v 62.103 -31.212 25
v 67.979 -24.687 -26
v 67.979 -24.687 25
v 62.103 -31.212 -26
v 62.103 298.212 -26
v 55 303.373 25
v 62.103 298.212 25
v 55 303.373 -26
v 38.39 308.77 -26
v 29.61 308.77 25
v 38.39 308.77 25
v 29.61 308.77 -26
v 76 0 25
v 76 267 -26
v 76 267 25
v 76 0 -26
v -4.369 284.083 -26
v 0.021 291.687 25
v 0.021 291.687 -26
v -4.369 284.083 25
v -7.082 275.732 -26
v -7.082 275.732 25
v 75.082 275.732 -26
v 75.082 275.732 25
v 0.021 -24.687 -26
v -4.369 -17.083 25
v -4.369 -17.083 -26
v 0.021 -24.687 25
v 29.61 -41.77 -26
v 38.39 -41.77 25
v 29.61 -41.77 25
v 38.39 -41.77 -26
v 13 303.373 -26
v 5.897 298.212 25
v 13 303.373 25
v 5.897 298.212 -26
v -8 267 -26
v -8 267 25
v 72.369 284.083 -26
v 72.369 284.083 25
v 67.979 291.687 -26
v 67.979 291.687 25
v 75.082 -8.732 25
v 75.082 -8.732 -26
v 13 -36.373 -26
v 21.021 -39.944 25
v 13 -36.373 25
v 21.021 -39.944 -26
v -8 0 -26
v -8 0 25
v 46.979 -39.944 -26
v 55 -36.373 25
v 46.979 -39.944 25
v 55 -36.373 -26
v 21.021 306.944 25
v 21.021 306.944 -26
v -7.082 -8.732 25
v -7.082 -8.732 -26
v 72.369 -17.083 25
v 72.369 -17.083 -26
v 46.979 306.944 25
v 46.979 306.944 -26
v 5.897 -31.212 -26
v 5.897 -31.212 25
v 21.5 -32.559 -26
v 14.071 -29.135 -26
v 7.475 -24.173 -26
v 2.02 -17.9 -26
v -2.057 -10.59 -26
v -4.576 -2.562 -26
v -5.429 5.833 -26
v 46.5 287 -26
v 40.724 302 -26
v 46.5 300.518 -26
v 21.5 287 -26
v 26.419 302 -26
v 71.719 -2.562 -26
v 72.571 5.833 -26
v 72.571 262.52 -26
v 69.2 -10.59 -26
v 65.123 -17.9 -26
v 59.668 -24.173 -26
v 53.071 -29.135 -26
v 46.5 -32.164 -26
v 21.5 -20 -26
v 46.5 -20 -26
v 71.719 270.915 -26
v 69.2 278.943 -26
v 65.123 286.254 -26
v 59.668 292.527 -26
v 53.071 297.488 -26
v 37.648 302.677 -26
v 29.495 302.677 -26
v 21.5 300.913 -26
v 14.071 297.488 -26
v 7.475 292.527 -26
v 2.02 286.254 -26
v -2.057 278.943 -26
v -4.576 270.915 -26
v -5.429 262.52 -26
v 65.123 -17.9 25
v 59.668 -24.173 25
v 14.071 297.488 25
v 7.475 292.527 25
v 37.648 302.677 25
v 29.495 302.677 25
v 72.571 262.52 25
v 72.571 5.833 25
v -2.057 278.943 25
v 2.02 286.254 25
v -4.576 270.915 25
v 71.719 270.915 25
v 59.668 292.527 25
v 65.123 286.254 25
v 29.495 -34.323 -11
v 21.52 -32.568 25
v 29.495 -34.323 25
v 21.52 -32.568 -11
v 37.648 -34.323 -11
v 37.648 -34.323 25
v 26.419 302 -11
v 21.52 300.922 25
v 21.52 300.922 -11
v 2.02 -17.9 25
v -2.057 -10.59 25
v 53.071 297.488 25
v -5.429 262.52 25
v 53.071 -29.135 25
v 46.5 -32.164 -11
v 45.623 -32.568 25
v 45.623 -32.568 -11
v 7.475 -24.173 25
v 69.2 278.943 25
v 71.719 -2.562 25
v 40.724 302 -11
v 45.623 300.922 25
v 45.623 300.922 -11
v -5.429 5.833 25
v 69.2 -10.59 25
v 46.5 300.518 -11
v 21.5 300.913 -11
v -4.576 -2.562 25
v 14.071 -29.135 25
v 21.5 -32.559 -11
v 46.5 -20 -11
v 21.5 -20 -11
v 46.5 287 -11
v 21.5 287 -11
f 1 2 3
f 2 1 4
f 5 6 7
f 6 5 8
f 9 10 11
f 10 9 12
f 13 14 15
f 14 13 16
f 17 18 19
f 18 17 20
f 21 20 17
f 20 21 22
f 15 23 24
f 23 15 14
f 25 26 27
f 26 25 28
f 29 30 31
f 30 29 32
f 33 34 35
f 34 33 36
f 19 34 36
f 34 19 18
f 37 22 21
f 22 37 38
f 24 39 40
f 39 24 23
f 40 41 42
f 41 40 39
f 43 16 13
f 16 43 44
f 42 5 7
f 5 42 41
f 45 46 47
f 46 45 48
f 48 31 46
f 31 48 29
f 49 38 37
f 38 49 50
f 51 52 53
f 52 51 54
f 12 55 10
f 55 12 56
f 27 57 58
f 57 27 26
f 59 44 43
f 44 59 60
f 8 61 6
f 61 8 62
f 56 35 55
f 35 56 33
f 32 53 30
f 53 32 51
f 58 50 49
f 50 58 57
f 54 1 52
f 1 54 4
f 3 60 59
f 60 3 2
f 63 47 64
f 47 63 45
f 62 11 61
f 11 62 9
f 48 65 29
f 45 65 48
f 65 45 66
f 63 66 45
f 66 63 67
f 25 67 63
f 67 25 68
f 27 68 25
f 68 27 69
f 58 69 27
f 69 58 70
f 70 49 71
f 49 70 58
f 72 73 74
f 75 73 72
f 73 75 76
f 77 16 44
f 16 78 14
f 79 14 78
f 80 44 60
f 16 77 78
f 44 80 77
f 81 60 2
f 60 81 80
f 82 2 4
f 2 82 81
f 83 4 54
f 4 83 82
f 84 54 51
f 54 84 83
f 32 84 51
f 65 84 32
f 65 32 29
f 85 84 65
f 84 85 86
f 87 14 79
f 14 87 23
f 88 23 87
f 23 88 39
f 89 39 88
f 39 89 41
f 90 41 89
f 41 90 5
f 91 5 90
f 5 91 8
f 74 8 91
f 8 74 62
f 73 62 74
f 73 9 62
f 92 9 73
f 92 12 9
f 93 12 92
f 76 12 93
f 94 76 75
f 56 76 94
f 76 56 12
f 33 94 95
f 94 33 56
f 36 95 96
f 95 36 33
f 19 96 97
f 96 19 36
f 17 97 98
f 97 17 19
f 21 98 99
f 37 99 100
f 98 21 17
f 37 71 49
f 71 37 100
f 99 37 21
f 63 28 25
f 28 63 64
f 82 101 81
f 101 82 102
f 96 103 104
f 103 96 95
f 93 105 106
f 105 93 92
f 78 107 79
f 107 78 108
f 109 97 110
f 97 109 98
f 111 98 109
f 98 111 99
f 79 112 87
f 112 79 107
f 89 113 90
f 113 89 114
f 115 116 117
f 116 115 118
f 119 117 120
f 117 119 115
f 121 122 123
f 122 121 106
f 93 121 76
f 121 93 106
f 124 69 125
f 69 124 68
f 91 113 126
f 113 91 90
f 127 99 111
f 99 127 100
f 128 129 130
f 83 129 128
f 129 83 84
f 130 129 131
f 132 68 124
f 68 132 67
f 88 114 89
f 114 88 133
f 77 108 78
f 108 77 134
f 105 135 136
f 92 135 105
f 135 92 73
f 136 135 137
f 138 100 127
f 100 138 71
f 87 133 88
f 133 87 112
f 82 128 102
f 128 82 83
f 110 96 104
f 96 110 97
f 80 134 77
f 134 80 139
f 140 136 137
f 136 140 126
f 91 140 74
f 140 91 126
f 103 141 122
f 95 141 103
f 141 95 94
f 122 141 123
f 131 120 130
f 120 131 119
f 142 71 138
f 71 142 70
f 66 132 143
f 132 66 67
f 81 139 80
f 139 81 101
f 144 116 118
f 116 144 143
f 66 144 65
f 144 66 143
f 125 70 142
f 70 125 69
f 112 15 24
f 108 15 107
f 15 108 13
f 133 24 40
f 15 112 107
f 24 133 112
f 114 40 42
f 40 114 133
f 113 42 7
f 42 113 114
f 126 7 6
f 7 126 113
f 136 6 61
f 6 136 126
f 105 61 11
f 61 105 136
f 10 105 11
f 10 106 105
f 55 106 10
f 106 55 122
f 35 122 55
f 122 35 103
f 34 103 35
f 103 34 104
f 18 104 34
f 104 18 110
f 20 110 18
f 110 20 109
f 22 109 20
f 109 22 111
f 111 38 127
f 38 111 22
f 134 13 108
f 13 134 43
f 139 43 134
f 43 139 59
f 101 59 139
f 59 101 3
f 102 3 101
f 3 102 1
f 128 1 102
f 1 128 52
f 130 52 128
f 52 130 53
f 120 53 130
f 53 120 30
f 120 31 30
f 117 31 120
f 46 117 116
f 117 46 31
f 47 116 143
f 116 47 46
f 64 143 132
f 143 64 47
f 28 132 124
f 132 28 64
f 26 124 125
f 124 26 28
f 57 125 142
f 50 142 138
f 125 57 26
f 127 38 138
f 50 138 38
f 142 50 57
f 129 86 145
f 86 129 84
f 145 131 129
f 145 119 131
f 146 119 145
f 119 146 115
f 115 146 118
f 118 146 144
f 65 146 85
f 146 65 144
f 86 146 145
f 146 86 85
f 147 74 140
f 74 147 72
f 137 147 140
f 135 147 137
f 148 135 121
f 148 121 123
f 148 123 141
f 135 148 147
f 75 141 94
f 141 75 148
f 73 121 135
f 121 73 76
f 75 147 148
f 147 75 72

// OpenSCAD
// Clock design by BananaC9 / Juan García

PCB_HEIGHT = 68; // Size of PCB in mm
PCB_WIDTH = 267; // Size of PCB in mm267
NUMBER_LEDS_HORIZONTAL=32; // Number of Leds in a row
NUMBER_LEDS_VERTICAL=8;   // Number of Leds in a column
DIFFUSER_HEIGHT = 50; // Height of diffuser
LED_SIZE = 5; // Size of leds in mm
DISTANCE_BETWEEN_LEDS=3.3; // Distance between leds in mm
WALL_THICKNESS=1; // Thinkess of walls
PCB_BORDER = 1;  // PCB Outer Boarder in mm
ROUNDED_END_RADIUS = 35;
buffer=DISTANCE_BETWEEN_LEDS-WALL_THICKNESS;
THICK_BORDER = PCB_BORDER - WALL_THICKNESS;


difference() {

// Create Main PCB Diffuser
    union() {
        hull() {
            cube([PCB_HEIGHT, PCB_WIDTH, DIFFUSER_HEIGHT]);
            translate([PCB_HEIGHT/2, 0, 0]) cylinder(h = DIFFUSER_HEIGHT + 2, r = ROUNDED_END_RADIUS * 1.2, center = true);
            translate([PCB_HEIGHT - ROUNDED_END_RADIUS, 0, 0]) cylinder(h = DIFFUSER_HEIGHT, r = ROUNDED_END_RADIUS, center = true);
            translate([PCB_HEIGHT/2, PCB_WIDTH, 0]) cylinder(h = DIFFUSER_HEIGHT + 2, r = ROUNDED_END_RADIUS * 1.2, center = true);
        }
    }
 

    union() {
        
        translate([2, ROUNDED_END_RADIUS/6, -1]) {
            resize([PCB_HEIGHT+10,PCB_WIDTH+ROUNDED_END_RADIUS*2,100], true) {
            hull() {
        cube([PCB_HEIGHT,PCB_WIDTH,DIFFUSER_HEIGHT]);
        
        translate([PCB_HEIGHT/2, 0, 0]) cylinder(h = DIFFUSER_HEIGHT+2, r = ROUNDED_END_RADIUS *1.2, center = true);
        translate([PCB_HEIGHT - ROUNDED_END_RADIUS, 0, 0]) cylinder(h = DIFFUSER_HEIGHT, r = ROUNDED_END_RADIUS, center = true);
        
        translate([PCB_HEIGHT/2, PCB_WIDTH, 0]) cylinder(h = DIFFUSER_HEIGHT+2, r = ROUNDED_END_RADIUS *1.2, center = true);
    }
    }
    }
}
   //remove top weird stuff 
translate([-25,-100,25]) {
        cube([200,500,25]);
    }
    
    
    
    // split to print in small printer
/*translate([-50,-ROUNDED_END_RADIUS*1.2, -DIFFUSER_HEIGHT-1]) {
    cube([PCB_HEIGHT*2, PCB_WIDTH/2+33, DIFFUSER_HEIGHT*5]);
    }

// split to print in small printer
translate([-50, PCB_WIDTH/2-9, -DIFFUSER_HEIGHT-1]) {
    cube([PCB_HEIGHT*2, PCB_WIDTH, DIFFUSER_HEIGHT*5]);
}
*/
    
}

//bolt stuff
        translate([PCB_HEIGHT/2-12.5, -ROUNDED_END_RADIUS, -26]) {
            cube([25,15,15]);
        }
        translate([PCB_HEIGHT/2-12.5, ROUNDED_END_RADIUS + PCB_WIDTH - 15, -26]) {
            cube([25,15,15]);
        }
